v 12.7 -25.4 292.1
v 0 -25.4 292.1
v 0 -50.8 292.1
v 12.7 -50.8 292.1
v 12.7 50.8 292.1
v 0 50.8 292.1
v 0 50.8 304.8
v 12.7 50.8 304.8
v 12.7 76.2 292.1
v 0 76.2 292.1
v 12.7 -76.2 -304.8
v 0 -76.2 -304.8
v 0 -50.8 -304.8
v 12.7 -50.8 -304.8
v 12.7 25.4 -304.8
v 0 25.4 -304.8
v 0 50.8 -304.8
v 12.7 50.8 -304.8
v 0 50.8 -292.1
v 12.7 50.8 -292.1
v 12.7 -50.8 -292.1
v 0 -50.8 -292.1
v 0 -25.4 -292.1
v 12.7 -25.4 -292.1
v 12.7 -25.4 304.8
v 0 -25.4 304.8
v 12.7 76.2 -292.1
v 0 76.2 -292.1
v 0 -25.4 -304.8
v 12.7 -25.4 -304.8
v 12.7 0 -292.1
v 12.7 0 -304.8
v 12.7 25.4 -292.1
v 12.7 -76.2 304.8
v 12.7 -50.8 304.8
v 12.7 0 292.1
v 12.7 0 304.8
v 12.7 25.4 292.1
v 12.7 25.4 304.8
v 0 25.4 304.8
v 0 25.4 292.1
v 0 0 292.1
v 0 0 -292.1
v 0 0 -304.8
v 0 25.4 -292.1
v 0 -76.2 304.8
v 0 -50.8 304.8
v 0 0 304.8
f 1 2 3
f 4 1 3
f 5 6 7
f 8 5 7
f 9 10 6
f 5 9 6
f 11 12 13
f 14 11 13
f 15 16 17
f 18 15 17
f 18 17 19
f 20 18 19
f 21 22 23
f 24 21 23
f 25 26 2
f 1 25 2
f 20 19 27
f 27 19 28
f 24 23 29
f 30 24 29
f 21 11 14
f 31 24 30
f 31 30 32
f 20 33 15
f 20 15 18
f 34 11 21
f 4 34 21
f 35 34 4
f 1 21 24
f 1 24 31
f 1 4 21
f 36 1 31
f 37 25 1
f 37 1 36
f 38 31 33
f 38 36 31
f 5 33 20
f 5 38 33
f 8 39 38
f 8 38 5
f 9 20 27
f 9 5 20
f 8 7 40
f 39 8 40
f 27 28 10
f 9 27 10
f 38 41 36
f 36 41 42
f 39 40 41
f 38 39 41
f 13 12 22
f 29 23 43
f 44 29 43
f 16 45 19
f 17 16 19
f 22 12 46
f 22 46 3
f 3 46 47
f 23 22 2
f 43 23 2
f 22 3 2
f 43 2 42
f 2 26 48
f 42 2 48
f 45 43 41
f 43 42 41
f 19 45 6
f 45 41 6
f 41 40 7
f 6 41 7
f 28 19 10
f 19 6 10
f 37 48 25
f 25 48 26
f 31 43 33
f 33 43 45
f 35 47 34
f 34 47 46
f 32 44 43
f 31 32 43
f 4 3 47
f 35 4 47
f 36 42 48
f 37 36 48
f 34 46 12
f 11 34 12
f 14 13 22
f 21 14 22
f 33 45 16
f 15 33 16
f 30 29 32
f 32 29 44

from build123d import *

# Parameters (mm, degrees)
F1_DEPTH = 12.7


with BuildPart() as f1:
    # F0 (on Right) → F1 (new body)
    with BuildSketch(Plane.YZ):
        Polygon((50.8, 292.1), (50.8, 304.8), (25.4, 304.8), (25.4, 292.1), (0, 292.1), (0, 304.8), (-25.4, 304.8), (-25.4, 292.1), (-50.8, 292.1), (-50.8, 304.8), (-76.2, 304.8), (-76.2, -304.8), (-50.8, -304.8), (-50.8, -292.1), (-25.4, -292.1), (-25.4, -304.8), (0, -304.8), (0, -292.1), (25.4, -292.1), (25.4, -304.8), (50.8, -304.8), (50.8, -292.1), (76.2, -292.1), (76.2, 292.1), align=None)
    extrude(amount=F1_DEPTH)


solid = f1.part
